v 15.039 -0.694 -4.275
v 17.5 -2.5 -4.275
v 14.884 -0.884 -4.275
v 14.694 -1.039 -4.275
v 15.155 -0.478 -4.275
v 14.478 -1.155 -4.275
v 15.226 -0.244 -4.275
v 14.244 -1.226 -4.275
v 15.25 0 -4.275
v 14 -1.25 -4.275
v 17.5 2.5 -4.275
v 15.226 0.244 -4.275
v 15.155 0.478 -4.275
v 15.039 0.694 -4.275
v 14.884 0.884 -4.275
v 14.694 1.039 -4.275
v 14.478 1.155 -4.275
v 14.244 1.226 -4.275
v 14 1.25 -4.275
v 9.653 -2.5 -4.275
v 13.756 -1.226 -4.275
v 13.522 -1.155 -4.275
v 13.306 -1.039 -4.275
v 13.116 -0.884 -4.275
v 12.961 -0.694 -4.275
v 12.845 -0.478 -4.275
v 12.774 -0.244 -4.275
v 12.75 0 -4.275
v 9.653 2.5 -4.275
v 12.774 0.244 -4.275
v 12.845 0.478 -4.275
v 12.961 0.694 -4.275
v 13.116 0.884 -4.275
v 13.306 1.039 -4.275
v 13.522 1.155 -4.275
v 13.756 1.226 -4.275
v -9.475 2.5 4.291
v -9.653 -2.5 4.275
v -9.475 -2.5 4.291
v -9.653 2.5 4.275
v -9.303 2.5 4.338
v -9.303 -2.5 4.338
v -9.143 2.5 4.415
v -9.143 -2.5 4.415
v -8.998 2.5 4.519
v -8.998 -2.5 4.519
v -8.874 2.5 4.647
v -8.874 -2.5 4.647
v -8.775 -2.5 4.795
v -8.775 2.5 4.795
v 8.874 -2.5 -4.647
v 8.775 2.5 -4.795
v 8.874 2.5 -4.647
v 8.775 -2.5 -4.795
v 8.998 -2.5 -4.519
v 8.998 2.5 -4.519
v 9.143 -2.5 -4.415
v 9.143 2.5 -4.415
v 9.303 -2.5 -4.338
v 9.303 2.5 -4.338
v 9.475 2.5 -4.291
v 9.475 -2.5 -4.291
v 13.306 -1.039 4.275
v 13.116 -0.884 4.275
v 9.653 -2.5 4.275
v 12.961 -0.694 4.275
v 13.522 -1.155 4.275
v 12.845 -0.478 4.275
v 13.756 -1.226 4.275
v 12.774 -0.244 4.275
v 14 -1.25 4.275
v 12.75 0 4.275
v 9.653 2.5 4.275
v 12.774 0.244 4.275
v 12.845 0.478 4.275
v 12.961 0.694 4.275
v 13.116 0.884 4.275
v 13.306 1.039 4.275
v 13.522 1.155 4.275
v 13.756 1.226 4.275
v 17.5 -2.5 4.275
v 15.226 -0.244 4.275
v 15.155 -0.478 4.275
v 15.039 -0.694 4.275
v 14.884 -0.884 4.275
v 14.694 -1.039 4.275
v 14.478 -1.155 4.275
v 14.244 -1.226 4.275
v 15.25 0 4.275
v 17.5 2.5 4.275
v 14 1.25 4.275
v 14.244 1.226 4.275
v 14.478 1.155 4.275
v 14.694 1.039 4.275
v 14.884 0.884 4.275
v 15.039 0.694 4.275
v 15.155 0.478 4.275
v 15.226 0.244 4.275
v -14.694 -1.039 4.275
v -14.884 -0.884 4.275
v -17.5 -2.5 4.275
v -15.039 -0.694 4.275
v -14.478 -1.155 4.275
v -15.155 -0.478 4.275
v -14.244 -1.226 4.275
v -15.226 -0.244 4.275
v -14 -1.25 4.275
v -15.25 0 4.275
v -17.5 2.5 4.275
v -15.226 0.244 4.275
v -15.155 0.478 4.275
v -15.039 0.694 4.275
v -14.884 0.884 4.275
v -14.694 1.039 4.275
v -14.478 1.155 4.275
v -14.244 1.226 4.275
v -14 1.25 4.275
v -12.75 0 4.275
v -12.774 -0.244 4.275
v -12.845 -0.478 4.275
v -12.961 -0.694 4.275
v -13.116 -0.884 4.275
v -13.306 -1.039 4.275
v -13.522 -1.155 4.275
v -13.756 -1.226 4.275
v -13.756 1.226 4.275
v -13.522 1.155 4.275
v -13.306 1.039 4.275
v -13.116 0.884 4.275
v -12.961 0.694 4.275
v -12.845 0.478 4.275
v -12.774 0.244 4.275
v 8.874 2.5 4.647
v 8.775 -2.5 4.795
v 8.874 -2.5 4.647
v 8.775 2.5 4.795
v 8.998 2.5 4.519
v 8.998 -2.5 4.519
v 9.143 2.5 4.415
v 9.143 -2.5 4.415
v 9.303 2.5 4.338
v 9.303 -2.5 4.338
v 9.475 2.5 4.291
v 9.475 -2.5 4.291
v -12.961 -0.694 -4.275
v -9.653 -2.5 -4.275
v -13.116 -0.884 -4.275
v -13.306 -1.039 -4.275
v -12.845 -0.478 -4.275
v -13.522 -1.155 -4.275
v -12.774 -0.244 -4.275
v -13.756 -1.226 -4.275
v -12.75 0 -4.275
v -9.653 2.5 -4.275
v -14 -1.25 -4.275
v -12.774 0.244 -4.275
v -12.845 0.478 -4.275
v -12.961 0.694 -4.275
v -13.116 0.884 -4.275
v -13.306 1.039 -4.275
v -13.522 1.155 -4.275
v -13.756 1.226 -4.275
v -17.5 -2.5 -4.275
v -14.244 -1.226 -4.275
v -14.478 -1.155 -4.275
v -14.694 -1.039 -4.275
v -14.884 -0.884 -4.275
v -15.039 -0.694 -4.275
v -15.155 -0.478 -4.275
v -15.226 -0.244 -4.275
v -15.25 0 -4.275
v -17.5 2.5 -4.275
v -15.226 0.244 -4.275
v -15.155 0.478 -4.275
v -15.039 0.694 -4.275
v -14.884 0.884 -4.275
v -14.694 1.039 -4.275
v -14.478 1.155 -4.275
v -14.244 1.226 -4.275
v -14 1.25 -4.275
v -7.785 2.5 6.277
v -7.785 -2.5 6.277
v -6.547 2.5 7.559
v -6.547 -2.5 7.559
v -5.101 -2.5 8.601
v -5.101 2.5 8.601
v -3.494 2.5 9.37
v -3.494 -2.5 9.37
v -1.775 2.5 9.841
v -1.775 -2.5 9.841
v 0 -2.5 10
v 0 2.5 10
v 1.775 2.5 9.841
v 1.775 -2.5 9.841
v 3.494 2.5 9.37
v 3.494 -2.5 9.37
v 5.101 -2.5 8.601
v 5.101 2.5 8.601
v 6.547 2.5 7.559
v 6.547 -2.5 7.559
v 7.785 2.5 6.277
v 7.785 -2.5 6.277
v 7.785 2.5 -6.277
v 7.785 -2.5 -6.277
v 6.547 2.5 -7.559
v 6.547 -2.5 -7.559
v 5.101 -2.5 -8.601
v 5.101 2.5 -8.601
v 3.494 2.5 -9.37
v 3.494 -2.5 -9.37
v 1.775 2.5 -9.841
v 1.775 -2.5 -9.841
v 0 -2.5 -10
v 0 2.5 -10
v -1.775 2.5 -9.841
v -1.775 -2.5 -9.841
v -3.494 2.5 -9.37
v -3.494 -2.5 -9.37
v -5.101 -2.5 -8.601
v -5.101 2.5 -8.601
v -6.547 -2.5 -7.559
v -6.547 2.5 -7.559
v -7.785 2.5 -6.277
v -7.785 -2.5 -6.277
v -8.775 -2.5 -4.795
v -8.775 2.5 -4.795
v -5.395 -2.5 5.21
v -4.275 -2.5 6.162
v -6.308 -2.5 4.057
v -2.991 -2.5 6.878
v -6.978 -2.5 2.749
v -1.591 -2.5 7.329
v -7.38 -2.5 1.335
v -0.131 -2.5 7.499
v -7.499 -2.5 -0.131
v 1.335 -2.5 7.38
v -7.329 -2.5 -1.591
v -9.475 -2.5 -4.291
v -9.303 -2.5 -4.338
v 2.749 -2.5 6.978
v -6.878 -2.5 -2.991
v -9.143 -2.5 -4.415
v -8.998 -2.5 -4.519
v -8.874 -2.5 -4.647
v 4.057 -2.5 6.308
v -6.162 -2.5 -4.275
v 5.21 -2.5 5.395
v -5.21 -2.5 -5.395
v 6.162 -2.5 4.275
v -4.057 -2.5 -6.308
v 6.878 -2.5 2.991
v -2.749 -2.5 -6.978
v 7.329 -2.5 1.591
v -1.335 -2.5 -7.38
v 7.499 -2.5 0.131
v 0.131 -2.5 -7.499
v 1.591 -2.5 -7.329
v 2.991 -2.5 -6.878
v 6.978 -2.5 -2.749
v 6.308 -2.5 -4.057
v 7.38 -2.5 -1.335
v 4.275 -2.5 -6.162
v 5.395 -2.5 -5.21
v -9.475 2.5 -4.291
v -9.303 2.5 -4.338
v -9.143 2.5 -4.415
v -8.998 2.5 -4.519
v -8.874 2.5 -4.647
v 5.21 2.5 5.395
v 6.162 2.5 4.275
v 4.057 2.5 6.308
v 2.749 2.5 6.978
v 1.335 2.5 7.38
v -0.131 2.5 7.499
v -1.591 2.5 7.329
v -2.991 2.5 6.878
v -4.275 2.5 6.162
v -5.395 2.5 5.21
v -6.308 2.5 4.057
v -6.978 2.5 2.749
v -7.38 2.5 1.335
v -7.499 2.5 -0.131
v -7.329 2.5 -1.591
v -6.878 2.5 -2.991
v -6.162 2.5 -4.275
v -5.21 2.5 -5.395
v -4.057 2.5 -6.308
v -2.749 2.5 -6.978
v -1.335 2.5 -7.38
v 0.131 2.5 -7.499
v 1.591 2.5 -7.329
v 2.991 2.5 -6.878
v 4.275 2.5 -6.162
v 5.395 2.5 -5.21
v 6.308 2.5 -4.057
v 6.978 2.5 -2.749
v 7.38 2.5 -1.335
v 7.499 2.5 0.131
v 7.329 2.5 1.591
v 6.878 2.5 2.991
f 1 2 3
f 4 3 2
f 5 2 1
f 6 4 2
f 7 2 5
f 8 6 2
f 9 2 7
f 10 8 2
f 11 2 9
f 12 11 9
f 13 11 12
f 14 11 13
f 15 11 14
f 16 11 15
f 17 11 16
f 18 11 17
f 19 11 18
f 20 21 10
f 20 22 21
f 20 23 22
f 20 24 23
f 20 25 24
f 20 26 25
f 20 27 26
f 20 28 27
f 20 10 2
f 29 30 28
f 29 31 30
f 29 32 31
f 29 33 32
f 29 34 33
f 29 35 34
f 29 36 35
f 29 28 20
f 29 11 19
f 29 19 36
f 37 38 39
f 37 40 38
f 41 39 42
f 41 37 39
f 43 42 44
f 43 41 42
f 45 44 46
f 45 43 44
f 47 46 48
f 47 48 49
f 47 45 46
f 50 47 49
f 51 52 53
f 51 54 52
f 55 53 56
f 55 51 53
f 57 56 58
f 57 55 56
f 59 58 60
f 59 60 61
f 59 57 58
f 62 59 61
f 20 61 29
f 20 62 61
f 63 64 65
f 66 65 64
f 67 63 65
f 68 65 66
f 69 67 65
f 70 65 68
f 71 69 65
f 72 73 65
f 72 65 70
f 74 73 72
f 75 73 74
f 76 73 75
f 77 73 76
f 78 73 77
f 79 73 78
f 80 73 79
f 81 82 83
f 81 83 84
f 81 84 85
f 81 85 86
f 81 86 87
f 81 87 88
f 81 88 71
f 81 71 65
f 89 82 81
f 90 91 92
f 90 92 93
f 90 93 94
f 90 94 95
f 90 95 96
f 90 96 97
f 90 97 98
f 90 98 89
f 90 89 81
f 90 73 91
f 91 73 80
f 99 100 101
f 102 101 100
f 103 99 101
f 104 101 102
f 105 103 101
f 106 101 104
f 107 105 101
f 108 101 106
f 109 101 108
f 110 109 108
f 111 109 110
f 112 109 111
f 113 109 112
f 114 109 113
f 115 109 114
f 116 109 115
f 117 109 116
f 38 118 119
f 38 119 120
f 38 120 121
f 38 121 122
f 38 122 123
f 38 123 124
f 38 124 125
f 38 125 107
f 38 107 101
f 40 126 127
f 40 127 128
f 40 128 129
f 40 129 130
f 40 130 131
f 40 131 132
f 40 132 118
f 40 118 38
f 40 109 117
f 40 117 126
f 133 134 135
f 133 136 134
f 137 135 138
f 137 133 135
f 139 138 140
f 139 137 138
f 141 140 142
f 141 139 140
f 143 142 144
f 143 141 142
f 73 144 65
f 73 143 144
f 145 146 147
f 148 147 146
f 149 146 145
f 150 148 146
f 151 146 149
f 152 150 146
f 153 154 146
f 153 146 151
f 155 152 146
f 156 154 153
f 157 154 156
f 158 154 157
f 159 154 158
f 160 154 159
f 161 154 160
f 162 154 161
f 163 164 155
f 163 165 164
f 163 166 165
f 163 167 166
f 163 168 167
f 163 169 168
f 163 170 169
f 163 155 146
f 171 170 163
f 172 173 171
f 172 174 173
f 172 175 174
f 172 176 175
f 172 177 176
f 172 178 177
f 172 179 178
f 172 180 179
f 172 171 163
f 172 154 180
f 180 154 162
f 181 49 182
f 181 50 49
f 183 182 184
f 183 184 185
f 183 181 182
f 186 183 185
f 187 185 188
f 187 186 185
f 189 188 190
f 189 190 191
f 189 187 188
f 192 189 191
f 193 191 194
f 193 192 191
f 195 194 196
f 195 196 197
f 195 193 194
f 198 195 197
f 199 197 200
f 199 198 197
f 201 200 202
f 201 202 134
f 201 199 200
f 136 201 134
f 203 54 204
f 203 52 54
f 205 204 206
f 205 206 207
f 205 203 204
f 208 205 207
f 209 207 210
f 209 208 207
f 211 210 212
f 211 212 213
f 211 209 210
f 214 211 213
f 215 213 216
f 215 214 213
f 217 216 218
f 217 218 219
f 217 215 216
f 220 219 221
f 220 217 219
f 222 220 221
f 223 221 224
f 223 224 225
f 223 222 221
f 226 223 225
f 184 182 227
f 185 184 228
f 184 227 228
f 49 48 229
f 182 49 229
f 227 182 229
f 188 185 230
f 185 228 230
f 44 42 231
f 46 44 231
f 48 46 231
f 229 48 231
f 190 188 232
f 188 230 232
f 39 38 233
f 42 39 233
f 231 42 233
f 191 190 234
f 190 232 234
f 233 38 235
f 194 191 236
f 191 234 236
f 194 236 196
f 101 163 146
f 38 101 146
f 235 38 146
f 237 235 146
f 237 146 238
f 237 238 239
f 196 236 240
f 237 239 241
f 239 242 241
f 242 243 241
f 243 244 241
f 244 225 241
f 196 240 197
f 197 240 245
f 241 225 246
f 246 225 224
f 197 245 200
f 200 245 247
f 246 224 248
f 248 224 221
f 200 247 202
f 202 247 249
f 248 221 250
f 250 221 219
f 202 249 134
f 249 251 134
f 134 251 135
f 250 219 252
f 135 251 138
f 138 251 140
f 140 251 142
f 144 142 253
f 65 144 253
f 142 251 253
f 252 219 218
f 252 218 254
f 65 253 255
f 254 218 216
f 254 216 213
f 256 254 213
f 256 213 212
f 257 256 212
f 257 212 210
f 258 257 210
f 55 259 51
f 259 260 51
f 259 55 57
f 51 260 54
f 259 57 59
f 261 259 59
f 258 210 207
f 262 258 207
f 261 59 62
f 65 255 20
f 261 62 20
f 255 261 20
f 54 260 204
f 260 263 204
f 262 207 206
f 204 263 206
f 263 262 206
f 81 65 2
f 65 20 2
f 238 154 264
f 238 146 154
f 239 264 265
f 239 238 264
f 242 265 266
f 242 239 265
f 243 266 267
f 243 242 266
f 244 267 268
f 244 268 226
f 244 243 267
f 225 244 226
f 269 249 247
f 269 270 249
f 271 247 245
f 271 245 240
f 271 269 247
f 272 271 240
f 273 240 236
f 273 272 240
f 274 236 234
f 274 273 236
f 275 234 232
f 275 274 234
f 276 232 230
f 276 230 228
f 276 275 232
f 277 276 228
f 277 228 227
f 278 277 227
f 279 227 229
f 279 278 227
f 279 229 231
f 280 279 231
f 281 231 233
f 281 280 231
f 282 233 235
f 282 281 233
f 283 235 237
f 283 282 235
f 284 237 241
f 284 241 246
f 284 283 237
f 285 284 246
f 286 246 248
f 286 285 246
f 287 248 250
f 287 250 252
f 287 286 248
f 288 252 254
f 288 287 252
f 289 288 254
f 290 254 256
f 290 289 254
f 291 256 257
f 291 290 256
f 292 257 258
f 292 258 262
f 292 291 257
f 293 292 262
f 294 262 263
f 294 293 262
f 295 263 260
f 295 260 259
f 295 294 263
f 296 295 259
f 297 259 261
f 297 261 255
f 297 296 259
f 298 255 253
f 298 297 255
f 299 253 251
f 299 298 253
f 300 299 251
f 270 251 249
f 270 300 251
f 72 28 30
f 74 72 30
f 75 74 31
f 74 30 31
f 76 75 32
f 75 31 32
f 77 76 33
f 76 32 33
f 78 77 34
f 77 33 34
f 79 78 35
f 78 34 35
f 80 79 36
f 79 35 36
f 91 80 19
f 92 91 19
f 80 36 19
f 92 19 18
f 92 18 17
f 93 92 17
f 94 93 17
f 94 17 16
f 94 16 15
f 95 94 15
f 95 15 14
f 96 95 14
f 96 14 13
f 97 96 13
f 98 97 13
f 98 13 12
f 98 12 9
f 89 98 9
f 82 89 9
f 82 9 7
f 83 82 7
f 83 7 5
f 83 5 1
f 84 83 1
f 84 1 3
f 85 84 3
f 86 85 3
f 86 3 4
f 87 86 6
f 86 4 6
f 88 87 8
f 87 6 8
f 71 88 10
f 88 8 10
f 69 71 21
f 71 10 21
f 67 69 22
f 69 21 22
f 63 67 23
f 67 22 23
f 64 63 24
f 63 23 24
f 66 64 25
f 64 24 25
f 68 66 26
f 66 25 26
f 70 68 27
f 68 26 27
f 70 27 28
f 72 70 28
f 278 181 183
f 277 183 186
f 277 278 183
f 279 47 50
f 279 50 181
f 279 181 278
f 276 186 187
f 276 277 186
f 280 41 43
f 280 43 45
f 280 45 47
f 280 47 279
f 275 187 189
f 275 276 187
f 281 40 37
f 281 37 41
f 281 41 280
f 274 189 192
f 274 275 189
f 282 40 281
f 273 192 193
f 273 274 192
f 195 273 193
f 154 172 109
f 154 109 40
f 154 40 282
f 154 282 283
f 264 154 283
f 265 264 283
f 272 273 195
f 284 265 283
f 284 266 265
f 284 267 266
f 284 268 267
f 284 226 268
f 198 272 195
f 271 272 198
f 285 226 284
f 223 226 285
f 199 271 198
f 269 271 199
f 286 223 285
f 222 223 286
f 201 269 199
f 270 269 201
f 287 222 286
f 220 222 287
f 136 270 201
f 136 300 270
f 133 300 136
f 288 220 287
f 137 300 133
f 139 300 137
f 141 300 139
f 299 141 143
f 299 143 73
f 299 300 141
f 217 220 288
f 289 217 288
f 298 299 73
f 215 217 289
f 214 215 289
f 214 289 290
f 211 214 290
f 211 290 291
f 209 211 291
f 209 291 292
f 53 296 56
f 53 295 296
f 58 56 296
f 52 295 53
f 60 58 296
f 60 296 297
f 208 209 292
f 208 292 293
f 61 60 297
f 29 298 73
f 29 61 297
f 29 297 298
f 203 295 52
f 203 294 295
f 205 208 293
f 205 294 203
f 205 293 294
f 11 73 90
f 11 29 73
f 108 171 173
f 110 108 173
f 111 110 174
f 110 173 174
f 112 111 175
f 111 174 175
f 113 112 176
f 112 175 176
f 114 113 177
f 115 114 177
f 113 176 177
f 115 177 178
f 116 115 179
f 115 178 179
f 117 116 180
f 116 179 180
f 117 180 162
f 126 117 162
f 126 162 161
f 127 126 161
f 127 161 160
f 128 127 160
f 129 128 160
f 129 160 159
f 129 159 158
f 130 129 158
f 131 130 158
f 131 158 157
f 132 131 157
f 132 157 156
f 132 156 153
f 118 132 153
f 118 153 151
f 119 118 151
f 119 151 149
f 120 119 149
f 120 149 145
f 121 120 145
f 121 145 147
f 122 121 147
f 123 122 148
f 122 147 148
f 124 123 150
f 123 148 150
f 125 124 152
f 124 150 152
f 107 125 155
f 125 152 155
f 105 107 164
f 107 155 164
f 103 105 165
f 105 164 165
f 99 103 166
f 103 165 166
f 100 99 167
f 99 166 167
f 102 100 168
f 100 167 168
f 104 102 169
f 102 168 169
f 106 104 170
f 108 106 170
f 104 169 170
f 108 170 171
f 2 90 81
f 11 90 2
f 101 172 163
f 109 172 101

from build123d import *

# Parameters (mm, degrees)
EXTRUDE_1_DEPTH     = 2.5
SKETCH_2_R          = 1.250000000000001
SKETCH_2_R_2        = 1.2499999999999991
CUT_EXTRUDE_1_DEPTH = 10
FILLET_1_R          = 1


with BuildPart() as part:
    # ｽｹｯﾁ1 → ﾎﾞｽ - 押し出し1 (new, symmetric)
    with BuildSketch(Plane(origin=(0, 0, 0), x_dir=(1, 0, 0), z_dir=(0, 1, 0))):
        with BuildLine():
            Line((-9.040153483210384, 4.275000000000001), (-17.500000000000004, 4.275000000000001))
            Line((-17.500000000000004, 4.275000000000001), (-17.5, -4.2749999999999995))
            Line((-17.5, -4.2749999999999995), (-9.040153483210384, -4.2749999999999995))
            ThreePointArc((-9.040153483210364, -4.2749999999999355), (-9.999999999999996, 2.09e-15), (-9.040153483210364, 4.27499999999994))
        make_face()
        with BuildLine():
            Line((-6.162335190493877, 4.275), (-9.040153483210384, 4.275000000000001))
            ThreePointArc((-9.040153483210364, 4.27499999999994), (-9.999999999999996, 2.09e-15), (-9.040153483210364, -4.2749999999999355))
            Line((-9.040153483210384, -4.2749999999999995), (-6.162335190493877, -4.2749999999999995))
            ThreePointArc((-6.162335190493898, -4.275000000000058), (-7.499999999999997, 1.79e-15), (-6.1623351904938986, 4.275000000000059))
        make_face()
        with BuildLine():
            ThreePointArc((10.000000000000004, 8.7e-16), (9.757088060279663, 2.1907150850688284), (9.040153483210378, 4.2749999999999195))
            Line((9.040153483210407, 4.2749999999999995), (6.162335190493945, 4.275))
            ThreePointArc((6.162335190493945, 4.275000000000002), (7.15777597891638, 2.2396970856898766), (7.500000000000004, 8.7e-16))
            ThreePointArc((7.500000000000004, -9.7e-16), (7.157775978916378, -2.2396970856898806), (6.162335190493939, -4.275000000000008))
            Line((6.162335190493941, -4.275), (9.04015348321041, -4.275))
            ThreePointArc((9.04015348321038, -4.274999999999914), (9.757088060279663, -2.190715085068826), (10.000000000000004, -1.58e-15))
        make_face()
        with BuildLine():
            ThreePointArc((9.040153483210378, 4.2749999999999195), (1.296e-14, 10), (-9.040153483210364, 4.27499999999994))
            Line((-9.040153483210384, 4.275000000000001), (-6.162335190493877, 4.275))
            ThreePointArc((-6.1623351904938986, 4.275000000000059), (3.724e-14, 7.500000000000002), (6.162335190493945, 4.275000000000002))
            Line((6.162335190493945, 4.275), (9.040153483210407, 4.2749999999999995))
        make_face()
        with BuildLine():
            Line((17.499999999999996, 4.2749999999999995), (9.040153483210407, 4.2749999999999995))
            ThreePointArc((9.040153483210378, 4.2749999999999195), (9.757088060279663, 2.1907150850688284), (10.000000000000004, 8.7e-16))
            ThreePointArc((10.000000000000004, -1.58e-15), (9.757088060279663, -2.190715085068826), (9.04015348321038, -4.274999999999914))
            Line((9.04015348321041, -4.275), (17.5, -4.275))
            Line((17.5, -4.275000000000001), (17.499999999999996, 4.2749999999999995))
        make_face()
        with BuildLine():
            Line((-6.162335190493877, -4.2749999999999995), (-9.040153483210384, -4.2749999999999995))
            ThreePointArc((-9.040153483210364, -4.2749999999999355), (1.94e-14, -10), (9.04015348321038, -4.274999999999914))
            Line((9.04015348321041, -4.275), (6.162335190493941, -4.275))
            ThreePointArc((6.162335190493939, -4.275000000000008), (3.54e-14, -7.5), (-6.162335190493898, -4.275000000000058))
        make_face()
    extrude(amount=EXTRUDE_1_DEPTH, both=True)

    # ｽｹｯﾁ2 → ｶｯﾄ - 押し出し1 (cut)
    with BuildSketch(Plane(origin=(2.1e-16, 0, -4.275), x_dir=(-1, 0, -5e-17), z_dir=(5e-17, 0, -1))):
        with Locations((14, 0)):
            Circle(SKETCH_2_R)
        with Locations((-14, 0)):
            Circle(SKETCH_2_R_2)
    extrude(amount=-CUT_EXTRUDE_1_DEPTH, mode=Mode.SUBTRACT)

    # ﾌｨﾚｯﾄ1
    fillet_1_edges = [part.edges().sort_by_distance(p)[0] for p in [
        (-9.040153483210375, 0, 4.274999999999968),
        (-9.040153483210375, 0, -4.27499999999997),
        (9.040153483210393, 0, -4.2749999999999595),
        (9.040153483210396, 0, 4.274999999999958),
    ]]
    fillet(fillet_1_edges, radius=FILLET_1_R)


solid = part.part
